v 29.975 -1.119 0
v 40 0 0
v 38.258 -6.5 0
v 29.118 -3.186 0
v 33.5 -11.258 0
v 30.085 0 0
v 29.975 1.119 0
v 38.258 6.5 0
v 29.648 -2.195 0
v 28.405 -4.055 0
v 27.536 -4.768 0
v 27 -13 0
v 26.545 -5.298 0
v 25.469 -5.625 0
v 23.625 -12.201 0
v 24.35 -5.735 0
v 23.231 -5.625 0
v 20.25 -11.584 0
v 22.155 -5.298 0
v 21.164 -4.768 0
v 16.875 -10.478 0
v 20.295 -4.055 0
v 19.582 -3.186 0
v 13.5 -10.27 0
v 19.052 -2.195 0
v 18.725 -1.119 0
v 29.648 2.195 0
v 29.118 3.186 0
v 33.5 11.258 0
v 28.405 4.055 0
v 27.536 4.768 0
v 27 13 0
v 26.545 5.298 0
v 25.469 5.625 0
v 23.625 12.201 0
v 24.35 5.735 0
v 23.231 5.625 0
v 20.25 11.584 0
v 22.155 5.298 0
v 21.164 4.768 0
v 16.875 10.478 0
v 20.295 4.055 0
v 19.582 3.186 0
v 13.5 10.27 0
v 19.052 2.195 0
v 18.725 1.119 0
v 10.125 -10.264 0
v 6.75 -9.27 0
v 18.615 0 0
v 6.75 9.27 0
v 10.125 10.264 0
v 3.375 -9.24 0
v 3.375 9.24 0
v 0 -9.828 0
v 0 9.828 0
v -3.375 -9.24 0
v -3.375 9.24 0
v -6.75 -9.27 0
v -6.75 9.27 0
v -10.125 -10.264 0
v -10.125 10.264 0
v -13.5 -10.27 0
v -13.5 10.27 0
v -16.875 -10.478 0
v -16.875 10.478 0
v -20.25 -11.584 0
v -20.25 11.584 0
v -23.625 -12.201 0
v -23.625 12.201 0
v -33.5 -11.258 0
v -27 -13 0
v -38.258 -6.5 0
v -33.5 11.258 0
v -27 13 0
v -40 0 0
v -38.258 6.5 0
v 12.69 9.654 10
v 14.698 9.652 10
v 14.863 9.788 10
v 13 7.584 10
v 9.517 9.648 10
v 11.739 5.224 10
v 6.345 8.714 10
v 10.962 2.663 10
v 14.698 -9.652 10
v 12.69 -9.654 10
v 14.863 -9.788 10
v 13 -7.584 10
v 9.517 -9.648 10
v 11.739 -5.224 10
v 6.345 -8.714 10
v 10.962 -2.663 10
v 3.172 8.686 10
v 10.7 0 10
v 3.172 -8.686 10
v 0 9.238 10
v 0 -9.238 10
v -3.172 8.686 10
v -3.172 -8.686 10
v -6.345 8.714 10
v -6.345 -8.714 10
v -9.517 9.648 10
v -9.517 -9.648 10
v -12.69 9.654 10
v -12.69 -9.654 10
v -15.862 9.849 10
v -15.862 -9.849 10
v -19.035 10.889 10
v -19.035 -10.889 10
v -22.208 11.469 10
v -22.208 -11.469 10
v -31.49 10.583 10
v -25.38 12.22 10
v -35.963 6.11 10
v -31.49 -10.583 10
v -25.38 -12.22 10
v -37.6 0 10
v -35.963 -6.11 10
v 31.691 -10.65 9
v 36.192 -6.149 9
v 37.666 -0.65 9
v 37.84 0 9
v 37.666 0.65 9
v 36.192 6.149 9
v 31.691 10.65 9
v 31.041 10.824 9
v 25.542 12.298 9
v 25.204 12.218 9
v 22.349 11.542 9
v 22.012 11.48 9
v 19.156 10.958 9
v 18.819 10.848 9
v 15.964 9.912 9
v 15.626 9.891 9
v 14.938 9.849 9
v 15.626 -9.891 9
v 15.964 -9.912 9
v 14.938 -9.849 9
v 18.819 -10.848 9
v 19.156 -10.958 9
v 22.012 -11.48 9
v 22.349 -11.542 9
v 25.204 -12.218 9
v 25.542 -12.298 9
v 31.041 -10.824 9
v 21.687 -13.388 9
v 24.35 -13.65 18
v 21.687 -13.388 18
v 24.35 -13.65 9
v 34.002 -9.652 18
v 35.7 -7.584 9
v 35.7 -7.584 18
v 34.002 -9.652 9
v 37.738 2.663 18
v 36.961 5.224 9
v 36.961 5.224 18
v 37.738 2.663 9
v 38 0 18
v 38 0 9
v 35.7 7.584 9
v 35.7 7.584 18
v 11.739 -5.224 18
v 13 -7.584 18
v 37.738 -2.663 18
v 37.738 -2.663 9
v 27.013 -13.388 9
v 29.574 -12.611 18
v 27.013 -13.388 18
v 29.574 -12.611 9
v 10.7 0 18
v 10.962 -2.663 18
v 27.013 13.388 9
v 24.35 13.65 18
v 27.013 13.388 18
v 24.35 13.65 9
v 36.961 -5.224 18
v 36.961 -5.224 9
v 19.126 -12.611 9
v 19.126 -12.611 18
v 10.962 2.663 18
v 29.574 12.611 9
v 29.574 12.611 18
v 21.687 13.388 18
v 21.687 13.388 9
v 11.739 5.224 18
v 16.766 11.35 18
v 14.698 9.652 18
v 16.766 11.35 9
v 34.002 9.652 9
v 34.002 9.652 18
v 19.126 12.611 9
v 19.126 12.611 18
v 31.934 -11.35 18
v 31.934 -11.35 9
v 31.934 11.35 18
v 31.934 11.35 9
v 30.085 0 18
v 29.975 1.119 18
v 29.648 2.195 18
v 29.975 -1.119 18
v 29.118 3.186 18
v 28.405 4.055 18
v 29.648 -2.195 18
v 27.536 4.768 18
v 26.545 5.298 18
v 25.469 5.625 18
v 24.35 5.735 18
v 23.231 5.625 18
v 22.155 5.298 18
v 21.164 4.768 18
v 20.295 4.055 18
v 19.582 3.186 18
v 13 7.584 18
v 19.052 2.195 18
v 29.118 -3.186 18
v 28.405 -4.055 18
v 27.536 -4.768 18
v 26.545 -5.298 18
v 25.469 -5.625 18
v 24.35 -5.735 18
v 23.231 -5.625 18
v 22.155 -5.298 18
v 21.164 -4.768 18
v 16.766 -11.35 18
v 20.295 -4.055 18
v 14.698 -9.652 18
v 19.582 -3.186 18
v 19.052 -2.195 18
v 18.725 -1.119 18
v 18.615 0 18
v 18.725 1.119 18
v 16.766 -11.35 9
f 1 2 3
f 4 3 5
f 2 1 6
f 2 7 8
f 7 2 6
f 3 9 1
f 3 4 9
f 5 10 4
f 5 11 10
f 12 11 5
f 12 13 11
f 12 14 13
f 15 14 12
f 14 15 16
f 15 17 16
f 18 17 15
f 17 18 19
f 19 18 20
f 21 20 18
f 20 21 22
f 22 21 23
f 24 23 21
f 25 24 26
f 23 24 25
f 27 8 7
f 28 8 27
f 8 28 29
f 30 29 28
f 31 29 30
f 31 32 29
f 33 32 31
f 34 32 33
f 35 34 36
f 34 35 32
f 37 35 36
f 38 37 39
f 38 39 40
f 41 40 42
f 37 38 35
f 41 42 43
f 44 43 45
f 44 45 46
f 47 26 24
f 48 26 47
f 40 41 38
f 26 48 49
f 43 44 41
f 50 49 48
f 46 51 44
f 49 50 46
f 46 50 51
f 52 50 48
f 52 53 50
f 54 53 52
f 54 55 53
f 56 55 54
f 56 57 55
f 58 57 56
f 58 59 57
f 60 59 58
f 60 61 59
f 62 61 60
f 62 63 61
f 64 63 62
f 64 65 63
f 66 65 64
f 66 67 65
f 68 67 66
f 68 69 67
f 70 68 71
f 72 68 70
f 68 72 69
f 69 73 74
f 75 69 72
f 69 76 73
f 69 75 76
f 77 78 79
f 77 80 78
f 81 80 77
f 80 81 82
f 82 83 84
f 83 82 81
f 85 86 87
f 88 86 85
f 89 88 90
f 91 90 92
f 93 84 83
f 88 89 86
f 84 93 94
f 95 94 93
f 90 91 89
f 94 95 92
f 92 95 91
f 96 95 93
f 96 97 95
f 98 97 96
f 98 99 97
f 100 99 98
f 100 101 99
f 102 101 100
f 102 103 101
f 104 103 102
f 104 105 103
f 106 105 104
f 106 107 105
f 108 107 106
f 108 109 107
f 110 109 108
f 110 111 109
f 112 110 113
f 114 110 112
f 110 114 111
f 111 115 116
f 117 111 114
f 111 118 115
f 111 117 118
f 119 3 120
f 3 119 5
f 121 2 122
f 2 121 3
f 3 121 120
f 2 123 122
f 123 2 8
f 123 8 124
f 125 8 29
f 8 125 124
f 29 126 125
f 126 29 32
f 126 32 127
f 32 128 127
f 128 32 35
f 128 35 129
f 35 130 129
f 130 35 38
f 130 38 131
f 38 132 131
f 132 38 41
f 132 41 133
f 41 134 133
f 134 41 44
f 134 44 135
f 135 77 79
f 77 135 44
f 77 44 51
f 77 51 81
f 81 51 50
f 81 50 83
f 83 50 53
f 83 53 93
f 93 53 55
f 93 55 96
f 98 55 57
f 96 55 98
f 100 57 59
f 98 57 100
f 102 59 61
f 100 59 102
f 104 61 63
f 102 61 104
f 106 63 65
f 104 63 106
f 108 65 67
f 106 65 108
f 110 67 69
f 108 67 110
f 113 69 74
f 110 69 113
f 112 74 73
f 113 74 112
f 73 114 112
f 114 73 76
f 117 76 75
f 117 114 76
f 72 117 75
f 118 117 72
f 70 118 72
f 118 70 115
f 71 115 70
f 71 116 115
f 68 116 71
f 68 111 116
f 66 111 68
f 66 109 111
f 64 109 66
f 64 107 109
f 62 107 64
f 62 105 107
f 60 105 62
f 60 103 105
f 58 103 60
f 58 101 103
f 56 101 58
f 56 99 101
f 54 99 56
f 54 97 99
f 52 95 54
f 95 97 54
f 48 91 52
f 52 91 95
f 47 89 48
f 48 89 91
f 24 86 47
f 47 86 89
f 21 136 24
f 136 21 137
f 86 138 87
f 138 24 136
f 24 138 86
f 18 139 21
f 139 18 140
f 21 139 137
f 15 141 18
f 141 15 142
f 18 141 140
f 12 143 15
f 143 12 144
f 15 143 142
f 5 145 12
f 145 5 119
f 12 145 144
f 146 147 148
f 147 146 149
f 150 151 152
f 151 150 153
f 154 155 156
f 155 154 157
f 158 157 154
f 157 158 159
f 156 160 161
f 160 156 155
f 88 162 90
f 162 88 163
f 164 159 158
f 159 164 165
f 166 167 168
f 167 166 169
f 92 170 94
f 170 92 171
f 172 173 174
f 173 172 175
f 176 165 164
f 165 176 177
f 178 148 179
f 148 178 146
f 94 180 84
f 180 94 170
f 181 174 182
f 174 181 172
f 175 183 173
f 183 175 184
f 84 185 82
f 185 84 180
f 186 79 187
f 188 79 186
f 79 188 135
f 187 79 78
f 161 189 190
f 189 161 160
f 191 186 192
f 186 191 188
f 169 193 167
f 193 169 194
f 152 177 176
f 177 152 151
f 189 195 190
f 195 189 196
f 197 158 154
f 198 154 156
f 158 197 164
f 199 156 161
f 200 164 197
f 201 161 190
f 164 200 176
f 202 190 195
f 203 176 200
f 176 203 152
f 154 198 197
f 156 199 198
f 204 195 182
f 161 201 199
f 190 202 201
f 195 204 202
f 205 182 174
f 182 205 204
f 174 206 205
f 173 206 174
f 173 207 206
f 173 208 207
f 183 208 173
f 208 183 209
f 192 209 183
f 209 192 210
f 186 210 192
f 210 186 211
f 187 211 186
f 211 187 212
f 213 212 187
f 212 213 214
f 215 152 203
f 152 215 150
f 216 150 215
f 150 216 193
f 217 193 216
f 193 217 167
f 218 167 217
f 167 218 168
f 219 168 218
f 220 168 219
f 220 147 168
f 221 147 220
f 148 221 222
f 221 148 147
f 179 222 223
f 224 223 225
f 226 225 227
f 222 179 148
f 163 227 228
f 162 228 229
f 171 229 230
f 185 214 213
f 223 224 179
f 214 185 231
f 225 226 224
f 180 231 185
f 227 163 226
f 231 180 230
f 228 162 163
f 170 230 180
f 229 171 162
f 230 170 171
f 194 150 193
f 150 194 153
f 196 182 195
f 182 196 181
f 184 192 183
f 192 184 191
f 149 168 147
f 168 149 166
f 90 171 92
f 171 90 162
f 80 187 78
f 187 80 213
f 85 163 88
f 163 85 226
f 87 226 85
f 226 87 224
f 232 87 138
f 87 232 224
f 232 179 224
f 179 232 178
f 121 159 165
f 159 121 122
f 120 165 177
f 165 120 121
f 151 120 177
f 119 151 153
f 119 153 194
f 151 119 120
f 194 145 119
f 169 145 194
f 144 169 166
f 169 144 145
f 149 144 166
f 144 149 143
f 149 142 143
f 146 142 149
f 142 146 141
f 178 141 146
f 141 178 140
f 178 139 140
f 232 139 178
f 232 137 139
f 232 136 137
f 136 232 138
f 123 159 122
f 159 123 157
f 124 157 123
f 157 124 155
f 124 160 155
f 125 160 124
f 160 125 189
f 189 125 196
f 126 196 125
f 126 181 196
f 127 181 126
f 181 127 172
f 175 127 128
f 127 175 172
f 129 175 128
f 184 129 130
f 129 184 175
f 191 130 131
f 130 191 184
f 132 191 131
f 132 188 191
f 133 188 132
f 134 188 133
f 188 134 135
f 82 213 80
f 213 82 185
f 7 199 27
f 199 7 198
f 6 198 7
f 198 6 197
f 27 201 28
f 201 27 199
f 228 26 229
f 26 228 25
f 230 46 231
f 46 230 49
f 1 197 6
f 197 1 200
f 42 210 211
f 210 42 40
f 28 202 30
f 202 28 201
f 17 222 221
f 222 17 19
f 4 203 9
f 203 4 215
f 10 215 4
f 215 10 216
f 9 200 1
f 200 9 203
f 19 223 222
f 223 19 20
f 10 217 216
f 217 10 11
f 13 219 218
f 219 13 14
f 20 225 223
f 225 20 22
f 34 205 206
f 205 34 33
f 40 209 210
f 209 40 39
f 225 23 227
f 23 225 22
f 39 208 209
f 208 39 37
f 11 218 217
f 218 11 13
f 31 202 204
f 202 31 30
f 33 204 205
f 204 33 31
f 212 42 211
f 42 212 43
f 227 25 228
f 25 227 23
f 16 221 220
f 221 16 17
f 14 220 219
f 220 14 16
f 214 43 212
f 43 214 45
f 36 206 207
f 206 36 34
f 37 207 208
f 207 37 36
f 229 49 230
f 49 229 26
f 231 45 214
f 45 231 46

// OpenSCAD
$fn = 32;

// ----------------------------------------------------------------------
// Handle: 80 x 26 mm grip, 10 mm thick
// ----------------------------------------------------------------------

// --- parameters (mm) ---
length = 80;              // grip length
width = 26;               // grip width
thickness = 10;           // grip thickness
waist = 0.72;             // width factor at the middle
draft = 0.94;             // top face scale of the extrusion
scallops = 5;             // finger rests per side
ripple = 0.05;            // depth factor of the finger rests
boss_d = 27.3;            // mounting boss diameter
boss_h = 8;               // mounting boss height
boss_hole_d = 11.47;      // screw clearance through the boss
boss_r = 24.35;           // boss centre from the grip centre

/* ergonomic grip outline, closed spline-like polygon in the XY plane */
grip = [[-27, 13], [-23.625, 12.201], [-20.25, 11.584], [-16.875, 10.478], [-13.5, 10.27], [-10.125, 10.264], [-6.75, 9.27], [-3.375, 9.24], [0, 9.828], [3.375, 9.24], [6.75, 9.27], [10.125, 10.264], [13.5, 10.27], [16.875, 10.478], [20.25, 11.584], [23.625, 12.201], [27, 13], [33.5, 11.258], [38.258, 6.5], [40, 0], [38.258, -6.5], [33.5, -11.258], [27, -13], [27, -13], [23.625, -12.201], [20.25, -11.584], [16.875, -10.478], [13.5, -10.27], [10.125, -10.264], [6.75, -9.27], [3.375, -9.24], [0, -9.828], [-3.375, -9.24], [-6.75, -9.27], [-10.125, -10.264], [-13.5, -10.27], [-16.875, -10.478], [-20.25, -11.584], [-23.625, -12.201], [-27, -13], [-33.5, -11.258], [-38.258, -6.5], [-40, 0], [-38.258, 6.5], [-33.5, 11.258], [-27, 13]];

module grip_body() {
  linear_extrude(height = thickness, scale = draft) polygon(grip);
}

module boss_body() {
  /* sunk 1 mm into the grip so the joint overlaps */
  translate([boss_r, 0, thickness - 1]) cylinder(h = boss_h + 1, d = boss_d);
}

difference() {
  union() {
    grip_body();
    boss_body();
  }
  translate([boss_r, 0, -1]) cylinder(h = thickness + boss_h + 2, d = boss_hole_d);
}
